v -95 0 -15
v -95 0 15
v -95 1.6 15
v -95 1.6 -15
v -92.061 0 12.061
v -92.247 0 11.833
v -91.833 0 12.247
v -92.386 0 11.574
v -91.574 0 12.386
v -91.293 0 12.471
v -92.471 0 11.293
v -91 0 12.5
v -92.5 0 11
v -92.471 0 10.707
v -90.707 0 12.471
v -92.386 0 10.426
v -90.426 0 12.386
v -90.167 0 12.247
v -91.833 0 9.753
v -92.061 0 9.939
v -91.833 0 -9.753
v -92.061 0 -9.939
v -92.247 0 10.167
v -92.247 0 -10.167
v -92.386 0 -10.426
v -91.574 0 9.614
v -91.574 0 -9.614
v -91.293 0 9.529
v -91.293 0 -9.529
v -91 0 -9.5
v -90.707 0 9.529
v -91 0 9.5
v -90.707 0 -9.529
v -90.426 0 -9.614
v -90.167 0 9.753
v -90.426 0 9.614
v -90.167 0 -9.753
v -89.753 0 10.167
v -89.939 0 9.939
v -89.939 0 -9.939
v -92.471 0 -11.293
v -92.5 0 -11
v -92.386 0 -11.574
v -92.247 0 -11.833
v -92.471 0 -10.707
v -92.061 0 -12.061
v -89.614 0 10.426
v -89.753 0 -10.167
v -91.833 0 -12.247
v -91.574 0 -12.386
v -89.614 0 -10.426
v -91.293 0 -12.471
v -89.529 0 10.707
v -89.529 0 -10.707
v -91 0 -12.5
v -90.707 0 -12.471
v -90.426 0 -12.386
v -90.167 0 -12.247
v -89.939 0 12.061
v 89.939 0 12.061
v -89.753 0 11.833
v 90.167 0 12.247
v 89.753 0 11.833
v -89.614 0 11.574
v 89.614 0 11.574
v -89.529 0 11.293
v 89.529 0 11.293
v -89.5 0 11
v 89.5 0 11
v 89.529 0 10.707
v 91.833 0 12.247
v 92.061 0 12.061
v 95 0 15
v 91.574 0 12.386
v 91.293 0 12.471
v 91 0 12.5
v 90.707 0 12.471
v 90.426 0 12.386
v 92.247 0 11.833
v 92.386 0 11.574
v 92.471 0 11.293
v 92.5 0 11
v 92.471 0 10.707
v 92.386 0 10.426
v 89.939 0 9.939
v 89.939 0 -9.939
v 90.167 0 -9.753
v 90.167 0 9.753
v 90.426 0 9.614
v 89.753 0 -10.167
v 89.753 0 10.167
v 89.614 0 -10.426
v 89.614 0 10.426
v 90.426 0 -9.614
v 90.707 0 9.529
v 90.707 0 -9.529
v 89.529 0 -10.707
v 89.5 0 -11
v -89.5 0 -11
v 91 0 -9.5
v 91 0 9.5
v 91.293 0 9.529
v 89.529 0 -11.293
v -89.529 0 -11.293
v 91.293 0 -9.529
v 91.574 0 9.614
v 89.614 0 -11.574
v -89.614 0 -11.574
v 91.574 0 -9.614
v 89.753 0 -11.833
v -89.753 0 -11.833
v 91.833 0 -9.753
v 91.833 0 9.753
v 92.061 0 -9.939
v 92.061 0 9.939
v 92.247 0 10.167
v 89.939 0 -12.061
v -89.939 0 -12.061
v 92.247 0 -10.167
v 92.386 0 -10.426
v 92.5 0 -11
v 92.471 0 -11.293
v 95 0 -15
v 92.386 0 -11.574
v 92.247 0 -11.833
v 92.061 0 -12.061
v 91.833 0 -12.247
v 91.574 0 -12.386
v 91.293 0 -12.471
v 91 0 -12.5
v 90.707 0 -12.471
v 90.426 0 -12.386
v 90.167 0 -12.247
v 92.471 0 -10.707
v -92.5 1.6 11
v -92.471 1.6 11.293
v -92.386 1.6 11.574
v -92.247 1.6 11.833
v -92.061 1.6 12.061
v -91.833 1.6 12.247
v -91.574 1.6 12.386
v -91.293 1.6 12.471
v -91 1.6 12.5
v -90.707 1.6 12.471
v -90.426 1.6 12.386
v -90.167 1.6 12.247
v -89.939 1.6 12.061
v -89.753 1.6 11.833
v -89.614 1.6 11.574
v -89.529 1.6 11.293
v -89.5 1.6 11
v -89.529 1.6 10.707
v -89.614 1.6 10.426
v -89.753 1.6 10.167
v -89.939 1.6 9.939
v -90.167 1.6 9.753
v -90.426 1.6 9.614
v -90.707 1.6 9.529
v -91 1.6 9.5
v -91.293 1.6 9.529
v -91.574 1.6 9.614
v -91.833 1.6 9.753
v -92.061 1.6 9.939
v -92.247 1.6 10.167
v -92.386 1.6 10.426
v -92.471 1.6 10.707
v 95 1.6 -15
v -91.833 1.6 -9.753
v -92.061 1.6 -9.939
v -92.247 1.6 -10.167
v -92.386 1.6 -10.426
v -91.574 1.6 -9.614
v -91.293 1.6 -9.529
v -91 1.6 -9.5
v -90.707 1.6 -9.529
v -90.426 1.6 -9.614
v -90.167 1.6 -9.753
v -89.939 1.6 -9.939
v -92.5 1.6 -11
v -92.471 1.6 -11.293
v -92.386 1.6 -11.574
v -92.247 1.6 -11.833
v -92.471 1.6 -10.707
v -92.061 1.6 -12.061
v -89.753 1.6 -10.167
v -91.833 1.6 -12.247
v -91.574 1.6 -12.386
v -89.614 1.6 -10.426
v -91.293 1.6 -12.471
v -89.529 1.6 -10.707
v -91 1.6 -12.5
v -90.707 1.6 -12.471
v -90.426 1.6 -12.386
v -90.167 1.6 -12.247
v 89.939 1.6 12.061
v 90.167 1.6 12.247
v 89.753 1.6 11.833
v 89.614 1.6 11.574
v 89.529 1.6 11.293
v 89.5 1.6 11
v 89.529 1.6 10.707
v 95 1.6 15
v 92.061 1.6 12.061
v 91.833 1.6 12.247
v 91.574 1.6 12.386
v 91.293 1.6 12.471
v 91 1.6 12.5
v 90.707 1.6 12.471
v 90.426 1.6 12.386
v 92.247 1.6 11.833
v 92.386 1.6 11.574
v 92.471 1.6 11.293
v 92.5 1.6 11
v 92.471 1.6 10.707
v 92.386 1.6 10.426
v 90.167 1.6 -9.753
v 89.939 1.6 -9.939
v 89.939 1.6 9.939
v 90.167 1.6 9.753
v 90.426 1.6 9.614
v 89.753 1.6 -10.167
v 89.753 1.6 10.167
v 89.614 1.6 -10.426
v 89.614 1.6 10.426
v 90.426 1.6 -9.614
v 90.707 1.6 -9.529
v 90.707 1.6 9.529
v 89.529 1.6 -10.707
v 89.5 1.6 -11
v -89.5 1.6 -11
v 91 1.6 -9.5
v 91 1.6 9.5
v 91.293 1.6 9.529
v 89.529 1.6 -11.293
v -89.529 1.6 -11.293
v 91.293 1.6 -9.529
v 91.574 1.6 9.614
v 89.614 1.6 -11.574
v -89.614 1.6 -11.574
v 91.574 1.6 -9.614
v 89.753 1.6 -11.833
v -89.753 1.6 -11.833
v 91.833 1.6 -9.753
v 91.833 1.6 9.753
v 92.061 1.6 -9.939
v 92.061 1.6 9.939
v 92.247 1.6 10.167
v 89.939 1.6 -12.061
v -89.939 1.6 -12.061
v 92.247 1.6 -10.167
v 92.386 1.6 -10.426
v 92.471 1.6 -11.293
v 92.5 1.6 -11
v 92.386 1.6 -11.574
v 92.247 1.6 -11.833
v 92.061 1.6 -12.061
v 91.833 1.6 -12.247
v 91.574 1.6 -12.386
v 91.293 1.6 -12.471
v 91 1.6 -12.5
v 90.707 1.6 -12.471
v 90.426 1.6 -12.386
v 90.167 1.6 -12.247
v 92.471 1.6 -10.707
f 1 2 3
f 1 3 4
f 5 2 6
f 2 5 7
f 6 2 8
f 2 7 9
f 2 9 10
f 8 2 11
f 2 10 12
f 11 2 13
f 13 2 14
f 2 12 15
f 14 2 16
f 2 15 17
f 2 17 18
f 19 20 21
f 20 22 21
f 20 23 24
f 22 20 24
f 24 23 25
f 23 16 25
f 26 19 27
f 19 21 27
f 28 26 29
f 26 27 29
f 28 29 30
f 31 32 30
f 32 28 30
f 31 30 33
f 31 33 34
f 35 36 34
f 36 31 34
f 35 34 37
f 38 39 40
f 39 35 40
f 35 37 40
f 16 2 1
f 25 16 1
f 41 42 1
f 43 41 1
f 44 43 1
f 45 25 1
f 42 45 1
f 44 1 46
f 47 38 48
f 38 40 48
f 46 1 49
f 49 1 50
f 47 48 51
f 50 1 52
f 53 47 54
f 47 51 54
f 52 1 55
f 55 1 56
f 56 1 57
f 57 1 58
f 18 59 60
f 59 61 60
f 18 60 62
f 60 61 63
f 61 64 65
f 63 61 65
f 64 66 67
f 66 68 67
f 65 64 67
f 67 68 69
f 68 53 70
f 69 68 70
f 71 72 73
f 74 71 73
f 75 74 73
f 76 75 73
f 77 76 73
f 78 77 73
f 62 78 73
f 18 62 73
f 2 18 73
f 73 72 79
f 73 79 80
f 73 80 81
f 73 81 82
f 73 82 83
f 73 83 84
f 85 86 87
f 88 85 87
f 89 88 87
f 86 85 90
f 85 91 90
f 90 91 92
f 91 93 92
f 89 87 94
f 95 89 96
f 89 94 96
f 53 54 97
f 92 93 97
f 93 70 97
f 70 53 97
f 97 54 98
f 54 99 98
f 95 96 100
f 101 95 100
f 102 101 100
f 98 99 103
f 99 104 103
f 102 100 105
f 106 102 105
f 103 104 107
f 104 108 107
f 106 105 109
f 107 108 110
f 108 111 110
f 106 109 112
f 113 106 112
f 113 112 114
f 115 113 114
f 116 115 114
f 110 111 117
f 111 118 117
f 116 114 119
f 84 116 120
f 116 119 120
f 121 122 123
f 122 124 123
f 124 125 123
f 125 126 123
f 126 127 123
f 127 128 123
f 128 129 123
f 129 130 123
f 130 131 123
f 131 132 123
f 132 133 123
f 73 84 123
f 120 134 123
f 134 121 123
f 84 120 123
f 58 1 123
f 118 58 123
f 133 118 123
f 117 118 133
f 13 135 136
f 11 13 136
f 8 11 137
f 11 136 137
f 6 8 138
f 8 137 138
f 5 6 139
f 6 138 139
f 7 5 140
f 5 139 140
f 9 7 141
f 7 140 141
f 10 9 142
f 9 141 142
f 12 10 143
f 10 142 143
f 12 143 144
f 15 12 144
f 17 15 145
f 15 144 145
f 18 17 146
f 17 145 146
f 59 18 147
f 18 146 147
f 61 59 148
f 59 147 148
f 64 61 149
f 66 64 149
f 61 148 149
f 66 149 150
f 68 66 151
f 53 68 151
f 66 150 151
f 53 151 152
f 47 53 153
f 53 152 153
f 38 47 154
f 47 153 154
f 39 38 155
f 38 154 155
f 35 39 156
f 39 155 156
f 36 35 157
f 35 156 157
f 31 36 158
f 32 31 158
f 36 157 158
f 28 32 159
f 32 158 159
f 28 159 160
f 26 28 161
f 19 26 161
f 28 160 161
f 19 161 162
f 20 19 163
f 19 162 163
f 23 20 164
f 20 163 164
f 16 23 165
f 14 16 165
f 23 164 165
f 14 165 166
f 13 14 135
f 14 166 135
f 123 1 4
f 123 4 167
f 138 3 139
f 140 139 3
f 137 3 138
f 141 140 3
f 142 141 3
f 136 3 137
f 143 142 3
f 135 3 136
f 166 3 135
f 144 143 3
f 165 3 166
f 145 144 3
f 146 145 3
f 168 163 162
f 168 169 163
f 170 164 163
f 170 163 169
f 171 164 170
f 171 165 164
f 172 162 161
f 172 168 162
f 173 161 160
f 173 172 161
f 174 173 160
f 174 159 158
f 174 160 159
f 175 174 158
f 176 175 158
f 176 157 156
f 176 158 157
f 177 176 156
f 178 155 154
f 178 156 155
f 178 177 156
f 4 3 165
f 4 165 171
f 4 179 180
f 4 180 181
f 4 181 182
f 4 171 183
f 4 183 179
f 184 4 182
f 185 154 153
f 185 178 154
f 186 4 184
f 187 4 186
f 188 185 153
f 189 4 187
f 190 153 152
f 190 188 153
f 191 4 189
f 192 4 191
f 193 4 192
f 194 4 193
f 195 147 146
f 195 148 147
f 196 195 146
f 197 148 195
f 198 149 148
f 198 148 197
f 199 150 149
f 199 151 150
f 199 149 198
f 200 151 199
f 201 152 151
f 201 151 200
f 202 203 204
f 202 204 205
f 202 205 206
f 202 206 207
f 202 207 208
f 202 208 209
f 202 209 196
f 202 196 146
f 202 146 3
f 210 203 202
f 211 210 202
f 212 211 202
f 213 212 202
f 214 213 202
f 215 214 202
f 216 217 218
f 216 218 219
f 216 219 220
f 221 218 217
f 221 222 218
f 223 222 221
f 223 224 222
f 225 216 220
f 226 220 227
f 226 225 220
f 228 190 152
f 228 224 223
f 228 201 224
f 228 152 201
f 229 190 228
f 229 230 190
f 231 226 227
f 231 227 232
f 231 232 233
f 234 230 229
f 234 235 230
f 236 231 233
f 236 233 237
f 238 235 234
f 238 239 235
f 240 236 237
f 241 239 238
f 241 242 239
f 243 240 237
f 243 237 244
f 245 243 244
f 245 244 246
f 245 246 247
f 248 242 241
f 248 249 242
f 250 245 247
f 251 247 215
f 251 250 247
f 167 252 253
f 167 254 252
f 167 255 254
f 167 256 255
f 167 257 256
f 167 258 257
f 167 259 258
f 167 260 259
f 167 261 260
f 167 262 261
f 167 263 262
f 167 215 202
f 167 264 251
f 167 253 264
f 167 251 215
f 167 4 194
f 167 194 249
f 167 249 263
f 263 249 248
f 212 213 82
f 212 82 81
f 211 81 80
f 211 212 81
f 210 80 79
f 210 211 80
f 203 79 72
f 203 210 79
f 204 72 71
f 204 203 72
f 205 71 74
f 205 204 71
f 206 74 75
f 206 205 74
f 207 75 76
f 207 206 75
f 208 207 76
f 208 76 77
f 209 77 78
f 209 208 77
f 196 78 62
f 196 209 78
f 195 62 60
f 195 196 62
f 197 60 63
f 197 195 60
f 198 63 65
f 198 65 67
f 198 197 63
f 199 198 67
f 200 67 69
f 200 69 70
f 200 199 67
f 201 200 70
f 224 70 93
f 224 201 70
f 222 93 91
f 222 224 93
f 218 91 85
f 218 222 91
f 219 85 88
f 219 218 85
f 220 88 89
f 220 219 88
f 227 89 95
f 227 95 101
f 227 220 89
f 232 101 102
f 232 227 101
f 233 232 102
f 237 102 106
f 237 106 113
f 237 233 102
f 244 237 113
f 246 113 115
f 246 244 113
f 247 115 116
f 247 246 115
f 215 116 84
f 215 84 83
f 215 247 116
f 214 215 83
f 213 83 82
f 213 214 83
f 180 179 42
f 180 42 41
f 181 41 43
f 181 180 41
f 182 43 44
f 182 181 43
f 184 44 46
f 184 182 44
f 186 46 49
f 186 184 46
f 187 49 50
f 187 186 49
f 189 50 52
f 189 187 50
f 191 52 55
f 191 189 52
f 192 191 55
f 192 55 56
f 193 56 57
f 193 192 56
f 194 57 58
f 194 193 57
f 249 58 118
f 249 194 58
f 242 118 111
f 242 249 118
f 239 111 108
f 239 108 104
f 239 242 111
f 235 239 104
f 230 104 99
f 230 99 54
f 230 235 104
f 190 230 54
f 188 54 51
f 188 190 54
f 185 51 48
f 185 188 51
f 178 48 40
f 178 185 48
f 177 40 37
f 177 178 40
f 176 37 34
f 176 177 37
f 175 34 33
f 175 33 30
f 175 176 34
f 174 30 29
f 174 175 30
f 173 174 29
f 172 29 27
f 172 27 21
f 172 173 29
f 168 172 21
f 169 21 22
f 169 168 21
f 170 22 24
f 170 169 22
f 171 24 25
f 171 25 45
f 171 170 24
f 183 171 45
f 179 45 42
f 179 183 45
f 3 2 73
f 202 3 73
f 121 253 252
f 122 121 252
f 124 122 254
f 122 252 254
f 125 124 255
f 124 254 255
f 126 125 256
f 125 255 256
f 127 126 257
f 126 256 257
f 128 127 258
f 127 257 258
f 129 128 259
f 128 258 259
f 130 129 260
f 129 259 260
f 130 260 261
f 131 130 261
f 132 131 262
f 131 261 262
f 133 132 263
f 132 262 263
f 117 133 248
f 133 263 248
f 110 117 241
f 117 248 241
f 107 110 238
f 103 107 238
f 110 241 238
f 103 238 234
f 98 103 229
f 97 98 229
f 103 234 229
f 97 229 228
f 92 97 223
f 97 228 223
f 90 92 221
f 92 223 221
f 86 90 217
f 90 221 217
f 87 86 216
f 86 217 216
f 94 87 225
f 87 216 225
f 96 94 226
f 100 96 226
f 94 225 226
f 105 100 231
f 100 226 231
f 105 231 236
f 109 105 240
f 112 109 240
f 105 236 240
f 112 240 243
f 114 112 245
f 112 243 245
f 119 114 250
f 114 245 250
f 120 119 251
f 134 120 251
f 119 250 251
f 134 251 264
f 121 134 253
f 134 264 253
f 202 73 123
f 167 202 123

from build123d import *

# Parameters (mm, degrees)
SKETCH2_W               = 190
SKETCH2_H               = 30
BOSS_EXTRUDE1_DEPTH     = 1.6
SKETCH4_R               = 1.5
CUT_EXTRUDE2_DEPTH      = 1.6
MIRROR2_COPY_1_SKETCH_R = 1.5
MIRROR2_COPY_1_DEPTH    = 1.6


with BuildPart() as part:
    # Sketch2 → Boss-Extrude1 (new body)
    with BuildSketch(Plane(origin=(0, 0, 0), x_dir=(1, 0, 0), z_dir=(0, 1, 0))):
        Rectangle(SKETCH2_W, SKETCH2_H)
    extrude(amount=BOSS_EXTRUDE1_DEPTH)

    # Sketch4 → Cut-Extrude2 (cut)
    with BuildSketch(Plane(origin=(0, 1.6, 0), x_dir=(1, 0, 0), z_dir=(0, 1, 0))):
        with Locations((91, 11)):
            Circle(SKETCH4_R)
    cut_extrude2 = extrude(amount=-CUT_EXTRUDE2_DEPTH, mode=Mode.SUBTRACT)

    # Mirror1: Cut-Extrude2 across plane
    add(cut_extrude2.mirror(Plane.XY), mode=Mode.SUBTRACT)

    # Mirror2: Cut-Extrude2 across plane
    add(cut_extrude2.mirror(Plane(origin=(0, 0, 0), x_dir=(0, 0, 1), z_dir=(1, 0, 0))), mode=Mode.SUBTRACT)

    # Mirror2 copy 1 sketch → Mirror2 copy 1 (cut)
    with BuildSketch(Plane(origin=(0, 1.6, 0), x_dir=(-1, 0, 0), z_dir=(0, 1, 0))):
        with Locations((91, 11)):
            Circle(MIRROR2_COPY_1_SKETCH_R)
    extrude(amount=-MIRROR2_COPY_1_DEPTH, mode=Mode.SUBTRACT)


solid = part.part
